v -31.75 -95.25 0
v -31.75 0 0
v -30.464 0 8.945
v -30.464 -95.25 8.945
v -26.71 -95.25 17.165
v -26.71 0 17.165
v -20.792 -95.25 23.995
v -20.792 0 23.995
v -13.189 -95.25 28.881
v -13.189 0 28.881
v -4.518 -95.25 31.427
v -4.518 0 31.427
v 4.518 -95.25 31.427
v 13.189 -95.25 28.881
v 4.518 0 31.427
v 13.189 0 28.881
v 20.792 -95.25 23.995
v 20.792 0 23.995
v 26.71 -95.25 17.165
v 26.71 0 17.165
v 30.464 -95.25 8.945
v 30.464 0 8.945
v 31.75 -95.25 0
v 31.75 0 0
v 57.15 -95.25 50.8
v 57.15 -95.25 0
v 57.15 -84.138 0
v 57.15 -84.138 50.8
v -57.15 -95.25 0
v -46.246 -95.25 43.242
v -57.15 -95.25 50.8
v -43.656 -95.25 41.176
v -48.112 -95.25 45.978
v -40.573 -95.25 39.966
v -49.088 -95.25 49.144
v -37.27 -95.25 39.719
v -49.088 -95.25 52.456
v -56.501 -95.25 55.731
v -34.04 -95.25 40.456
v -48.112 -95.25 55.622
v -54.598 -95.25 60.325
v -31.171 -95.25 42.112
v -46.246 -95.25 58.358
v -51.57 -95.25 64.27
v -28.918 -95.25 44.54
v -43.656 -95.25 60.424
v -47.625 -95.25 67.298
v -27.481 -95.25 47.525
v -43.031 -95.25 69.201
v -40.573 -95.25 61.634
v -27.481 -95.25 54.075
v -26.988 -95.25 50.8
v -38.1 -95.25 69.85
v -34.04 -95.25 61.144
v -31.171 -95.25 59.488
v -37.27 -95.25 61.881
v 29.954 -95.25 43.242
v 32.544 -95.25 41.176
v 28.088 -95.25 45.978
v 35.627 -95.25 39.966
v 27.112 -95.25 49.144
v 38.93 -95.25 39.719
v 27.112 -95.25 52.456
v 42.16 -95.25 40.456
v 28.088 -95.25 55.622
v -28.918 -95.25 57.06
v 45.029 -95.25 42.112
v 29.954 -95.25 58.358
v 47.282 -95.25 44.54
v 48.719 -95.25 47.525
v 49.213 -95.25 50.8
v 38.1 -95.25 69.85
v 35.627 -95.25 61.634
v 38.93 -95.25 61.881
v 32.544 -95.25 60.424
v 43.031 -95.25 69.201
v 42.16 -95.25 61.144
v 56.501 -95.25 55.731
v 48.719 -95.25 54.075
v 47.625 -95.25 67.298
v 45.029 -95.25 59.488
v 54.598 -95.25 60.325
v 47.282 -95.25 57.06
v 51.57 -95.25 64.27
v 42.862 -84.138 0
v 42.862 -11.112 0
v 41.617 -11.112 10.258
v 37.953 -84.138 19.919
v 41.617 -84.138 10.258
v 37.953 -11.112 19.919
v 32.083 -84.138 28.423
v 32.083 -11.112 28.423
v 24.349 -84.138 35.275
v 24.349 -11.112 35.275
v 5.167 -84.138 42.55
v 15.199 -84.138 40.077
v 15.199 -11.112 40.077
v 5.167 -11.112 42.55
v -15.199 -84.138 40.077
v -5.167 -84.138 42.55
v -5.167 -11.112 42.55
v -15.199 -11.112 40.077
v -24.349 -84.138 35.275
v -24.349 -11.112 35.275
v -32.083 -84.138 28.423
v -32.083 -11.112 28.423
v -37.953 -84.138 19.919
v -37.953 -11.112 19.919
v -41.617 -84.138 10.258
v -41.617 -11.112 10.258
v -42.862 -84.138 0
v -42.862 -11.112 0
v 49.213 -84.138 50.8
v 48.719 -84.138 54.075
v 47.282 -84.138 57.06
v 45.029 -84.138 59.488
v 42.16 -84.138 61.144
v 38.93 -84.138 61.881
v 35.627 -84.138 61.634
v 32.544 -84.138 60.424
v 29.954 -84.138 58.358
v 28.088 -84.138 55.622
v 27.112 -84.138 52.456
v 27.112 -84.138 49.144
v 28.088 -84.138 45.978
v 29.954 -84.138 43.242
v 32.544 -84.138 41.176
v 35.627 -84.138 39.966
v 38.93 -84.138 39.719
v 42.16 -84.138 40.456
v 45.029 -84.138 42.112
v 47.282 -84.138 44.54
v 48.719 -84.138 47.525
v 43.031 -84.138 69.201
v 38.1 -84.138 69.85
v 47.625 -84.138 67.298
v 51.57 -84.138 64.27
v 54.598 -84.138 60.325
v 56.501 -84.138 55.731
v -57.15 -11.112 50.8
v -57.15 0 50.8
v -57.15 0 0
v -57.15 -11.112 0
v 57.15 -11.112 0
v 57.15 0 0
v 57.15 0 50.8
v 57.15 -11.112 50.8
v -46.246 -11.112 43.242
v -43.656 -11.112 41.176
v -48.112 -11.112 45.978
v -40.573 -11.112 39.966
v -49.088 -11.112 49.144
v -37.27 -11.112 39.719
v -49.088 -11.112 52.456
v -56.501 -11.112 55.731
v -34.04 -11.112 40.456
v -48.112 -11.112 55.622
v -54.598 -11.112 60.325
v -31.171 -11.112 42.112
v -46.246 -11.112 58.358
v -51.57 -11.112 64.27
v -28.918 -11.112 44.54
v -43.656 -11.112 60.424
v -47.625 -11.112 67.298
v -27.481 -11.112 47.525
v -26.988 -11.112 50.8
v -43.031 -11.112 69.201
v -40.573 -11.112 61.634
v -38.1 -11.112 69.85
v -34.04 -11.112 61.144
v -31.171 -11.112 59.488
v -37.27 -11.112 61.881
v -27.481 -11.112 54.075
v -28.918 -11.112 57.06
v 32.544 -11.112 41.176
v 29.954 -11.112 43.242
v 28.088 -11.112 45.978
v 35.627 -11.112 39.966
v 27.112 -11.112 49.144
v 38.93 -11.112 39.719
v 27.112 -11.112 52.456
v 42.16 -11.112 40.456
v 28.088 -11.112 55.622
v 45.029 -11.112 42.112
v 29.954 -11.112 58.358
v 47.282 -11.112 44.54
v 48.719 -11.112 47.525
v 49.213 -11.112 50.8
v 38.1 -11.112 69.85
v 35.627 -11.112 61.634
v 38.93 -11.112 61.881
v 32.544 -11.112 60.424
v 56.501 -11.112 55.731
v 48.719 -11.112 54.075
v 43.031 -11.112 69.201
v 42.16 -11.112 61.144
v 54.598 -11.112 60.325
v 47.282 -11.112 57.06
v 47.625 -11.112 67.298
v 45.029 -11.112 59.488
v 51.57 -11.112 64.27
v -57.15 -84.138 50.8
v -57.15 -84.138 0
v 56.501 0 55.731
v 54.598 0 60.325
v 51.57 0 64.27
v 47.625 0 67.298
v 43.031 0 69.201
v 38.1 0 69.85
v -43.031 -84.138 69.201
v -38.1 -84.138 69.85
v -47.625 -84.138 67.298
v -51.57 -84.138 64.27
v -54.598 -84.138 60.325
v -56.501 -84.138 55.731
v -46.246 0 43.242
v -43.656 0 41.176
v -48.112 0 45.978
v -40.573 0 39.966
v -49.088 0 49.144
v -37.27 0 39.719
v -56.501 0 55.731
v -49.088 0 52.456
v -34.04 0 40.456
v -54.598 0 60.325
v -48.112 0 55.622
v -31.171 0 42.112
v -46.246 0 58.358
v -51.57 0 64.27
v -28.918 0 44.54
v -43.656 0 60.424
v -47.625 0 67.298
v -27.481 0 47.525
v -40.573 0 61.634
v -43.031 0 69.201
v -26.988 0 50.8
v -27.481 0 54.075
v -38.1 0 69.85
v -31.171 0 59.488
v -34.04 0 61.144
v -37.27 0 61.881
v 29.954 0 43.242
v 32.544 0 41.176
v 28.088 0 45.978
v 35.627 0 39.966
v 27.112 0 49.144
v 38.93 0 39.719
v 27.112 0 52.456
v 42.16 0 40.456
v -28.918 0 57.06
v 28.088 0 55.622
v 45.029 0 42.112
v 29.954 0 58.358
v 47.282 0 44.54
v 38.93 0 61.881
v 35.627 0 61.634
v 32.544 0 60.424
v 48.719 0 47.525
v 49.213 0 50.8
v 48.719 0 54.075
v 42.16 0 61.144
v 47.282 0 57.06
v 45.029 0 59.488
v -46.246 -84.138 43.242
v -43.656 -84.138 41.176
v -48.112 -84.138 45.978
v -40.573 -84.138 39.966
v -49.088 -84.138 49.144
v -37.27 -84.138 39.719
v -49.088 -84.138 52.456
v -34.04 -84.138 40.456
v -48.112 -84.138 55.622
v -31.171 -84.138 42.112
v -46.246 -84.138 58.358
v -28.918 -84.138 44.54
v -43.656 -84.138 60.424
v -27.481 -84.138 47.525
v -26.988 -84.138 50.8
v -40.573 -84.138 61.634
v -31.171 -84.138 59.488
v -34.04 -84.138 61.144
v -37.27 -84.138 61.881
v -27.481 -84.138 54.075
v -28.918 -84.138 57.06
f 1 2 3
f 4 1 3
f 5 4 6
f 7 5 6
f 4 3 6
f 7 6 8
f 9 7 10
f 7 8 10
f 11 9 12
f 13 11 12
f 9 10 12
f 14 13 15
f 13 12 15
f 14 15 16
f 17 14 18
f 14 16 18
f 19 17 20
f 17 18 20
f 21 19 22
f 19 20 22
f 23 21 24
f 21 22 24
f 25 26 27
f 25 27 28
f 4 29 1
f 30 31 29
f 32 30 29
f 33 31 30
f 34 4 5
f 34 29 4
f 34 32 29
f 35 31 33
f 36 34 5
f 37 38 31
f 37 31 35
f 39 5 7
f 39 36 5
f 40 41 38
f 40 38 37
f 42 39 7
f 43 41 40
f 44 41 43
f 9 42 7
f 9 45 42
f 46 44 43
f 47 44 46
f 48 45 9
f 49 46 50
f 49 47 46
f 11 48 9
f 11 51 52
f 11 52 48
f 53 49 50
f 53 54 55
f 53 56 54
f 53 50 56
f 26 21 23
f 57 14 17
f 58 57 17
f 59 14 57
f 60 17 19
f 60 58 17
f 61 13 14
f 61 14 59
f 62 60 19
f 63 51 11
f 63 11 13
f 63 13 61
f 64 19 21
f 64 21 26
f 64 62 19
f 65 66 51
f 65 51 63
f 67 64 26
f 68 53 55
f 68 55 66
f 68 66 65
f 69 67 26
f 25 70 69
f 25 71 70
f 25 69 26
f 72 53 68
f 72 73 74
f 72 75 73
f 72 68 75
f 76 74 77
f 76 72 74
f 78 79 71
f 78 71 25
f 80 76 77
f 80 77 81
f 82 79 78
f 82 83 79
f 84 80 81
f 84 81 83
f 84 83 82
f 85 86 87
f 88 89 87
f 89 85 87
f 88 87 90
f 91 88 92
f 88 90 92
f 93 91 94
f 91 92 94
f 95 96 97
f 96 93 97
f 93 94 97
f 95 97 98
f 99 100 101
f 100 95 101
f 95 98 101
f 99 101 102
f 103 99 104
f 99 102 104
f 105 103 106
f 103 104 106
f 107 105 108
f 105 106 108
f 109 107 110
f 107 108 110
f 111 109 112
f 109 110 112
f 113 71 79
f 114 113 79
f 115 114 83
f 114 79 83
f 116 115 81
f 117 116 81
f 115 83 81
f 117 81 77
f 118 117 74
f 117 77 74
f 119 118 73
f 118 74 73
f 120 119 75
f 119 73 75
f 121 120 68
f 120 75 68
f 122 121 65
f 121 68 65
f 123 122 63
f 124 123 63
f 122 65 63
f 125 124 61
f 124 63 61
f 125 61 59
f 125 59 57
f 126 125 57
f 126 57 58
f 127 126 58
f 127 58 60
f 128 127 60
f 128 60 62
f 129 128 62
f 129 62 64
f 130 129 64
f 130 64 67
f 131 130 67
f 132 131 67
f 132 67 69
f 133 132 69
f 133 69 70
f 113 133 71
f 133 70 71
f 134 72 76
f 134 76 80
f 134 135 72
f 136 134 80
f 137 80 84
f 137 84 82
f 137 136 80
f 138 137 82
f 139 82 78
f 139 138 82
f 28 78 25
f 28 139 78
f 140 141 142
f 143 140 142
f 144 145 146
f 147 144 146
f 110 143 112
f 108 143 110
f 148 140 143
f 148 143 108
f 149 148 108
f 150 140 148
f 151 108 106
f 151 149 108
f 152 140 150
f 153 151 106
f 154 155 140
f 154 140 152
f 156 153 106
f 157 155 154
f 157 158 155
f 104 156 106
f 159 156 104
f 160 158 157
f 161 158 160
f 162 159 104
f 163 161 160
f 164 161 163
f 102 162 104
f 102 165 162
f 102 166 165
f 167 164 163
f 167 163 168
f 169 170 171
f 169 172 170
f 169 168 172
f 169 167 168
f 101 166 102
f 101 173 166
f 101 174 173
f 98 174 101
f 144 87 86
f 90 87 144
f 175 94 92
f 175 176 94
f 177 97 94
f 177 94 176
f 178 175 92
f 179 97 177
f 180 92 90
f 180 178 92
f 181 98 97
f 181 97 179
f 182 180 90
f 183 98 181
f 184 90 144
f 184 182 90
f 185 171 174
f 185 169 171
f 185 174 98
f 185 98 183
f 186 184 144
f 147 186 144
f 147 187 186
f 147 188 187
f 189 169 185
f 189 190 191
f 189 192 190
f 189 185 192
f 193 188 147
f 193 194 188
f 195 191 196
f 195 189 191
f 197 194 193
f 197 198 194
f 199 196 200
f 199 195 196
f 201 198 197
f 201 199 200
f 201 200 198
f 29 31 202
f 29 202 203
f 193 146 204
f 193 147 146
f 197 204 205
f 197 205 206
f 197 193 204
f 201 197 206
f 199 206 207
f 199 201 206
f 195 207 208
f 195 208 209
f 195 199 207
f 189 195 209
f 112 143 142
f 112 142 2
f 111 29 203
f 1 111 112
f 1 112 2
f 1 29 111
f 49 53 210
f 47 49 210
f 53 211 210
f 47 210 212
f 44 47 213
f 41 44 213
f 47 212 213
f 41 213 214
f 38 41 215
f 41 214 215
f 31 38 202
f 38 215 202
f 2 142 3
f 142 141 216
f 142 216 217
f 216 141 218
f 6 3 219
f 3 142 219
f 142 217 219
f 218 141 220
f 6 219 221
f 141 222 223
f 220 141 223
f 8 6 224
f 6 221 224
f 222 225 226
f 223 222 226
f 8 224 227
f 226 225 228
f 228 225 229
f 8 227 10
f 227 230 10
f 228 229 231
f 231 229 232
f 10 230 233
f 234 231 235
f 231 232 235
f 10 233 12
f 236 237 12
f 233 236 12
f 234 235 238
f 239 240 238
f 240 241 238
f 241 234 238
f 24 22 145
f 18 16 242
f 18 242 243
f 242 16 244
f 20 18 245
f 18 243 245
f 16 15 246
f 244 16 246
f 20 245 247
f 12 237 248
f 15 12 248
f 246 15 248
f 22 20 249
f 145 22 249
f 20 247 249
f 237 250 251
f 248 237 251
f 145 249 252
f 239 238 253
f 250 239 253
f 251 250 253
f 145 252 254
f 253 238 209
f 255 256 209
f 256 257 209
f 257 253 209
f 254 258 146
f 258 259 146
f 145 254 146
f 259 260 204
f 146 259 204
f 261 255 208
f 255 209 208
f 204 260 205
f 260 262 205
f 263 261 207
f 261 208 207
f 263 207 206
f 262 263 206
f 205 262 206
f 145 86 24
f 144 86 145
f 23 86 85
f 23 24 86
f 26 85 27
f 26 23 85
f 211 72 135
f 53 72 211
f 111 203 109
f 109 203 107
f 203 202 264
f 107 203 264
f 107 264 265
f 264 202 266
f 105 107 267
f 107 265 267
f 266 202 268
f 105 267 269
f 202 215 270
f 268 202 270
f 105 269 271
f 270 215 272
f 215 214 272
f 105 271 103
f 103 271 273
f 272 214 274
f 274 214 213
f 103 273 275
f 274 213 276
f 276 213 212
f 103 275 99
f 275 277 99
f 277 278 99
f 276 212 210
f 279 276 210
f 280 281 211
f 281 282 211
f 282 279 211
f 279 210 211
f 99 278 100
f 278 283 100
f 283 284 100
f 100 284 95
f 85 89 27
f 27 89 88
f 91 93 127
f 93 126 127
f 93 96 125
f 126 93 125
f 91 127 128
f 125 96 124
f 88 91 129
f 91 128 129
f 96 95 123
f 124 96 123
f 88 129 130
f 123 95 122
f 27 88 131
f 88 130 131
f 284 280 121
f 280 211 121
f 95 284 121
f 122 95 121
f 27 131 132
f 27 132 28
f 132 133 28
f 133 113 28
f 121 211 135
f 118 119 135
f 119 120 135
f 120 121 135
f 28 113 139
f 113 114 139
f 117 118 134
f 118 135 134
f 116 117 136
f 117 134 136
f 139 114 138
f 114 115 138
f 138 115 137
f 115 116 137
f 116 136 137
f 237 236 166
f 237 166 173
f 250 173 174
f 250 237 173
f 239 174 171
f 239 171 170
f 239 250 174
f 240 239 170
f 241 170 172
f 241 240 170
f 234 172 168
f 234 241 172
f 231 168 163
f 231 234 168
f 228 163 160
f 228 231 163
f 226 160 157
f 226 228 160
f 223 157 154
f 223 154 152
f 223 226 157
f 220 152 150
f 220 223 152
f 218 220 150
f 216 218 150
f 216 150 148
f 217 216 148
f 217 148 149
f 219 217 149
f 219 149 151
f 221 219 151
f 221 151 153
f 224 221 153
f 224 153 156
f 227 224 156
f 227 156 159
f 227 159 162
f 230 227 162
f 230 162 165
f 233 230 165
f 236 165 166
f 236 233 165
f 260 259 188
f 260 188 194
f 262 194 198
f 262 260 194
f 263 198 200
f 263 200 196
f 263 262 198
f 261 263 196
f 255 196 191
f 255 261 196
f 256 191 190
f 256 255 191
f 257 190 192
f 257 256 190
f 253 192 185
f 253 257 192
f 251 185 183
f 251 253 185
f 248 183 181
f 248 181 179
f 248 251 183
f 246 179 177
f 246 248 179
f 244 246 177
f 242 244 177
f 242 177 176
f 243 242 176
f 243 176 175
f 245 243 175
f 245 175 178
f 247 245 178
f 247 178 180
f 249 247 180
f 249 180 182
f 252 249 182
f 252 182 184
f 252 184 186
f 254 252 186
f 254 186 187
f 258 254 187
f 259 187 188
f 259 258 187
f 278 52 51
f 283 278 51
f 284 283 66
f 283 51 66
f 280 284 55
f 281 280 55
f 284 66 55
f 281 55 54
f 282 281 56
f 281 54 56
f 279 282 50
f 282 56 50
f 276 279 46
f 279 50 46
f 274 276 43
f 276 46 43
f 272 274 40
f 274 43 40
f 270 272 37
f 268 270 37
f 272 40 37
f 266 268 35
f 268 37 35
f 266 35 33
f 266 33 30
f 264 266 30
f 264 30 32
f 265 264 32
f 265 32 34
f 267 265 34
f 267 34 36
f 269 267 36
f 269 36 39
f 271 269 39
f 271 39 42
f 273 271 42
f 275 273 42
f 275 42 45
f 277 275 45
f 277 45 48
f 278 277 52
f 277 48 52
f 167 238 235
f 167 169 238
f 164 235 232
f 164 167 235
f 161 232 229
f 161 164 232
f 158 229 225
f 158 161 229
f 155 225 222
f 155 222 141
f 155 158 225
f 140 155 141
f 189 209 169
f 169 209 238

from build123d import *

# Parameters (mm, degrees)
F1_DEPTH = 95.25
F0_R     = 11.1125
F2_DEPTH = 11.1125
F3_R     = 11.1125
F4_DEPTH = 11.1125
F5_R     = 19.05


with BuildPart() as f1:
    # F0 (on Front) → F1 (new body)
    with BuildSketch(Plane.XZ):
        with BuildLine():
            Line((31.75, 0), (42.8625, 0))
            ThreePointArc((42.8625, 0), (0, 42.8625), (-42.8625, 0))
            Line((-42.8625, 0), (-31.75, 0))
            ThreePointArc((-31.75, 0), (0, 31.75), (31.75, 0))
        make_face()
    extrude(amount=F1_DEPTH)

    # F0 (on Front) → F2 (join)
    with BuildSketch(Plane.XZ):
        with BuildLine():
            ThreePointArc((-42.8625, 0), (0, 42.8625), (42.8625, 0))
            Line((42.8625, 0), (57.15, 0))
            Line((57.15, 0), (57.15, 69.85))
            Line((57.15, 69.85), (-57.15, 69.85))
            Line((-57.15, 69.85), (-57.15, 0))
            Line((-57.15, 0), (-42.8625, 0))
        make_face()
        with Locations((-38.1, 50.8)):
            Circle(F0_R, mode=Mode.SUBTRACT)
        with Locations((38.1, 50.8)):
            Circle(F0_R, mode=Mode.SUBTRACT)
    extrude(amount=F2_DEPTH)

    # F3 (on face) → F4 (join)
    with BuildSketch(Plane.XZ.offset(95.25)):
        with BuildLine():
            ThreePointArc((-42.8625, 0), (0, 42.8625), (42.8625, 0))
            Line((42.8625, 0), (57.15, 0))
            Line((57.15, 0), (57.15, 69.85))
            Line((57.15, 69.85), (-57.15, 69.85))
            Line((-57.15, 69.85), (-57.15, 0))
            Line((-57.15, 0), (-42.8625, 0))
        make_face()
        with Locations((-38.1, 50.8)):
            Circle(F3_R, mode=Mode.SUBTRACT)
        with Locations((38.1, 50.8)):
            Circle(F3_R, mode=Mode.SUBTRACT)
    extrude(amount=-F4_DEPTH)

    # F5
    f5_edges = [f1.edges().sort_by_distance(p)[0] for p in [
        (57.15, -89.69375, 69.85),
        (-57.15, -5.55625, 69.85),
        (-57.15, -89.69375, 69.85),
        (57.15, -5.55625, 69.85),
    ]]
    fillet(f5_edges, radius=F5_R)


solid = f1.part
